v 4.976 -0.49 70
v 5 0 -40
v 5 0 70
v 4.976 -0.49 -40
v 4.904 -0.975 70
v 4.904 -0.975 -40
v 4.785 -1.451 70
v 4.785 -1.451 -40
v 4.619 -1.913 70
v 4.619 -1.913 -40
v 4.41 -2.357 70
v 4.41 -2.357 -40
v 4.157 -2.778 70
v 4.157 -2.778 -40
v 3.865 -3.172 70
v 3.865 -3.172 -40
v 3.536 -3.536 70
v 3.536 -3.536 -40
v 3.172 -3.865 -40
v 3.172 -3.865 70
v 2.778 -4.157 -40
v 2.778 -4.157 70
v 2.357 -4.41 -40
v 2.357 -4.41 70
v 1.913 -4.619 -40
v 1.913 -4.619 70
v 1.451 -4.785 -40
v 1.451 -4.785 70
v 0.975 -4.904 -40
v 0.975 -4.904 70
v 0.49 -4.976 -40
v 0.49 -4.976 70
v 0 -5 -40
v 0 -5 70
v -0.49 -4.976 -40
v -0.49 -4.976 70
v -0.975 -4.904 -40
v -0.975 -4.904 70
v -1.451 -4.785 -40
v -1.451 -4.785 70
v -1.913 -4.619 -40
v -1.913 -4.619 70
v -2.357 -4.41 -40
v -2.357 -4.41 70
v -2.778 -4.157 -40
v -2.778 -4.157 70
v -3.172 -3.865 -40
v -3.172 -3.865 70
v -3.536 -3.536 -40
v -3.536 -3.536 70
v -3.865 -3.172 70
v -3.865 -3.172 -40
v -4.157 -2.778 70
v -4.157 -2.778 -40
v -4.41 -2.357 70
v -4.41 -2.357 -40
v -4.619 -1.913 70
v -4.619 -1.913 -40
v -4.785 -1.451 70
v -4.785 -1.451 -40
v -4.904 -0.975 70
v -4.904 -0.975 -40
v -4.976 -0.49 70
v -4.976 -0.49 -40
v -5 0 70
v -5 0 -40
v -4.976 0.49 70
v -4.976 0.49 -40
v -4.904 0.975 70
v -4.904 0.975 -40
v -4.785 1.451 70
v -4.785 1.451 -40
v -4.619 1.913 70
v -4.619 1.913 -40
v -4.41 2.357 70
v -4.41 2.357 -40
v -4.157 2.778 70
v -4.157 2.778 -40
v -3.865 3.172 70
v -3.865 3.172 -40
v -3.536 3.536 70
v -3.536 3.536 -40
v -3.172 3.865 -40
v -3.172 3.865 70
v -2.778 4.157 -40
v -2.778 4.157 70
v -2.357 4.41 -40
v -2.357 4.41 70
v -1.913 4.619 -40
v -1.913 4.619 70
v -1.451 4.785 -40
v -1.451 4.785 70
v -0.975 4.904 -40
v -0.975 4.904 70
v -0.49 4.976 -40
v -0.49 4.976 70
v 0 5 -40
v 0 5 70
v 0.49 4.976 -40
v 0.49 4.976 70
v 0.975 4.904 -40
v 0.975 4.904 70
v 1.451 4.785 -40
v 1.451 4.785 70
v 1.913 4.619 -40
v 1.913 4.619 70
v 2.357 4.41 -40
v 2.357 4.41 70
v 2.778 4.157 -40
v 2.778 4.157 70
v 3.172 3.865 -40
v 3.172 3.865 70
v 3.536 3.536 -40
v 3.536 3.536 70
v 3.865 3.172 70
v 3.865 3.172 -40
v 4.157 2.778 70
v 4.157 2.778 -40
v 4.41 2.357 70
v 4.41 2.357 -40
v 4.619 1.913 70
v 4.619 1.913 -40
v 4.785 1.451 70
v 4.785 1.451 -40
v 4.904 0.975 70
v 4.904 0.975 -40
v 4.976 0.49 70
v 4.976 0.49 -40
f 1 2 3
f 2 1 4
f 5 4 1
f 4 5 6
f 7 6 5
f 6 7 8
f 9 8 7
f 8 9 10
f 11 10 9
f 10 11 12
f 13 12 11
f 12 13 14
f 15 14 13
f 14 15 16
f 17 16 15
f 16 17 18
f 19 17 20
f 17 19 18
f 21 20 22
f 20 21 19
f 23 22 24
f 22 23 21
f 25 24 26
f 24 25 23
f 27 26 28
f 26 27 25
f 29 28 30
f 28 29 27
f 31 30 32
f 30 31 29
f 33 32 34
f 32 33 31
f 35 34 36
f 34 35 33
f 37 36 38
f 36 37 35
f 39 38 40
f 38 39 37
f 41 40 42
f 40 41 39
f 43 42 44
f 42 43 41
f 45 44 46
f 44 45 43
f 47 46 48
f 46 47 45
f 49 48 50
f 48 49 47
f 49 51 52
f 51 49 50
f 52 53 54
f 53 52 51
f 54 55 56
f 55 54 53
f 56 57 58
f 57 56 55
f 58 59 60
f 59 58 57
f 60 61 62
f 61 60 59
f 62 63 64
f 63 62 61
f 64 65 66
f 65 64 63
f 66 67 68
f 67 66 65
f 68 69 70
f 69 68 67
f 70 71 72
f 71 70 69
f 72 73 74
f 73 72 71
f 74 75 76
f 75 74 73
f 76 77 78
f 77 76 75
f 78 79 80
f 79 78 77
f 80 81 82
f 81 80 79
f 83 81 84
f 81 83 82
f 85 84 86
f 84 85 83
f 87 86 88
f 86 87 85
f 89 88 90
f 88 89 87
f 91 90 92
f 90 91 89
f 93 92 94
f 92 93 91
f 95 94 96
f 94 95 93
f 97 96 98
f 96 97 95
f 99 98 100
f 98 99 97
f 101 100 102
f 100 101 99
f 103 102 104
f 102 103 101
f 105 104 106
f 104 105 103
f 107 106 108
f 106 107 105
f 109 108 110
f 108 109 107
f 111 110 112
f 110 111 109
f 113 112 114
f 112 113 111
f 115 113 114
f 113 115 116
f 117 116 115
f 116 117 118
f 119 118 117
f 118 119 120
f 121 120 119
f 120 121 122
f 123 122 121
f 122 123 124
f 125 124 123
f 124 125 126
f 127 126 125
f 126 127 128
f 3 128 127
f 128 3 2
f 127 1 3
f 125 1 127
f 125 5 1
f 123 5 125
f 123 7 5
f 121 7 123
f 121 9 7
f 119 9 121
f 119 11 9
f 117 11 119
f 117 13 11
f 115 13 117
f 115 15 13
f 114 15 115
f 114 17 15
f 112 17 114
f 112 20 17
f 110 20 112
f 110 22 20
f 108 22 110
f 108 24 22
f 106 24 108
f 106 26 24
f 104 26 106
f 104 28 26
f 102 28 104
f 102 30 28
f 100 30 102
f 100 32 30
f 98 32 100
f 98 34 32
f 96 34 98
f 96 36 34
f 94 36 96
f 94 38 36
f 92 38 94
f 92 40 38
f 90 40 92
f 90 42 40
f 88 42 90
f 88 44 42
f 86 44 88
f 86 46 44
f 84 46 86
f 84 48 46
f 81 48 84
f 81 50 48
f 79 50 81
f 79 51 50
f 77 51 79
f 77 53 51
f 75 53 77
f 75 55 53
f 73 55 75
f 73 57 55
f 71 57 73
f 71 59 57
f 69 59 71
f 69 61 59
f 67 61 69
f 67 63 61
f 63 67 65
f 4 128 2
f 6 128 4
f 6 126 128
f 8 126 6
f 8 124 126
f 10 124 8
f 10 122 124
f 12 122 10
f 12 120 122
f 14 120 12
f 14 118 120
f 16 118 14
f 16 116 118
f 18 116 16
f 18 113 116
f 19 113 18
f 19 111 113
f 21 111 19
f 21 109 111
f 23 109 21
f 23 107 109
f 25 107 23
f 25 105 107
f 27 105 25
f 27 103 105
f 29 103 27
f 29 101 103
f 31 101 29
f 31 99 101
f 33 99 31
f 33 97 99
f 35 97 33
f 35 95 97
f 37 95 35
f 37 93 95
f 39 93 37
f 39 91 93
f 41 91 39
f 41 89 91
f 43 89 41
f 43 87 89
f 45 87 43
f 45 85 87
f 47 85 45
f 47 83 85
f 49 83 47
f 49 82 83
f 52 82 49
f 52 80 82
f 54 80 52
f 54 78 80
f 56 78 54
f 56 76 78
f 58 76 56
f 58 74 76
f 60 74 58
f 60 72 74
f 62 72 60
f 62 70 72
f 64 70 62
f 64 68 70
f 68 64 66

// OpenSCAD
// ============================================================
// ANCHOR SHAFT — Frame mounting rod
// ============================================================

include <../params.scad>

module anchor_shaft() {
    color(C_ANCHOR)
    zcyl(ANCHOR_SHAFT_D, ANCHOR_SHAFT_ZBOT, ANCHOR_SHAFT_ZTOP - ANCHOR_SHAFT_ZBOT);
}

// ============================================================
// STANDALONE PREVIEW
// ============================================================
rotate([180, 0, 0]) anchor_shaft();
